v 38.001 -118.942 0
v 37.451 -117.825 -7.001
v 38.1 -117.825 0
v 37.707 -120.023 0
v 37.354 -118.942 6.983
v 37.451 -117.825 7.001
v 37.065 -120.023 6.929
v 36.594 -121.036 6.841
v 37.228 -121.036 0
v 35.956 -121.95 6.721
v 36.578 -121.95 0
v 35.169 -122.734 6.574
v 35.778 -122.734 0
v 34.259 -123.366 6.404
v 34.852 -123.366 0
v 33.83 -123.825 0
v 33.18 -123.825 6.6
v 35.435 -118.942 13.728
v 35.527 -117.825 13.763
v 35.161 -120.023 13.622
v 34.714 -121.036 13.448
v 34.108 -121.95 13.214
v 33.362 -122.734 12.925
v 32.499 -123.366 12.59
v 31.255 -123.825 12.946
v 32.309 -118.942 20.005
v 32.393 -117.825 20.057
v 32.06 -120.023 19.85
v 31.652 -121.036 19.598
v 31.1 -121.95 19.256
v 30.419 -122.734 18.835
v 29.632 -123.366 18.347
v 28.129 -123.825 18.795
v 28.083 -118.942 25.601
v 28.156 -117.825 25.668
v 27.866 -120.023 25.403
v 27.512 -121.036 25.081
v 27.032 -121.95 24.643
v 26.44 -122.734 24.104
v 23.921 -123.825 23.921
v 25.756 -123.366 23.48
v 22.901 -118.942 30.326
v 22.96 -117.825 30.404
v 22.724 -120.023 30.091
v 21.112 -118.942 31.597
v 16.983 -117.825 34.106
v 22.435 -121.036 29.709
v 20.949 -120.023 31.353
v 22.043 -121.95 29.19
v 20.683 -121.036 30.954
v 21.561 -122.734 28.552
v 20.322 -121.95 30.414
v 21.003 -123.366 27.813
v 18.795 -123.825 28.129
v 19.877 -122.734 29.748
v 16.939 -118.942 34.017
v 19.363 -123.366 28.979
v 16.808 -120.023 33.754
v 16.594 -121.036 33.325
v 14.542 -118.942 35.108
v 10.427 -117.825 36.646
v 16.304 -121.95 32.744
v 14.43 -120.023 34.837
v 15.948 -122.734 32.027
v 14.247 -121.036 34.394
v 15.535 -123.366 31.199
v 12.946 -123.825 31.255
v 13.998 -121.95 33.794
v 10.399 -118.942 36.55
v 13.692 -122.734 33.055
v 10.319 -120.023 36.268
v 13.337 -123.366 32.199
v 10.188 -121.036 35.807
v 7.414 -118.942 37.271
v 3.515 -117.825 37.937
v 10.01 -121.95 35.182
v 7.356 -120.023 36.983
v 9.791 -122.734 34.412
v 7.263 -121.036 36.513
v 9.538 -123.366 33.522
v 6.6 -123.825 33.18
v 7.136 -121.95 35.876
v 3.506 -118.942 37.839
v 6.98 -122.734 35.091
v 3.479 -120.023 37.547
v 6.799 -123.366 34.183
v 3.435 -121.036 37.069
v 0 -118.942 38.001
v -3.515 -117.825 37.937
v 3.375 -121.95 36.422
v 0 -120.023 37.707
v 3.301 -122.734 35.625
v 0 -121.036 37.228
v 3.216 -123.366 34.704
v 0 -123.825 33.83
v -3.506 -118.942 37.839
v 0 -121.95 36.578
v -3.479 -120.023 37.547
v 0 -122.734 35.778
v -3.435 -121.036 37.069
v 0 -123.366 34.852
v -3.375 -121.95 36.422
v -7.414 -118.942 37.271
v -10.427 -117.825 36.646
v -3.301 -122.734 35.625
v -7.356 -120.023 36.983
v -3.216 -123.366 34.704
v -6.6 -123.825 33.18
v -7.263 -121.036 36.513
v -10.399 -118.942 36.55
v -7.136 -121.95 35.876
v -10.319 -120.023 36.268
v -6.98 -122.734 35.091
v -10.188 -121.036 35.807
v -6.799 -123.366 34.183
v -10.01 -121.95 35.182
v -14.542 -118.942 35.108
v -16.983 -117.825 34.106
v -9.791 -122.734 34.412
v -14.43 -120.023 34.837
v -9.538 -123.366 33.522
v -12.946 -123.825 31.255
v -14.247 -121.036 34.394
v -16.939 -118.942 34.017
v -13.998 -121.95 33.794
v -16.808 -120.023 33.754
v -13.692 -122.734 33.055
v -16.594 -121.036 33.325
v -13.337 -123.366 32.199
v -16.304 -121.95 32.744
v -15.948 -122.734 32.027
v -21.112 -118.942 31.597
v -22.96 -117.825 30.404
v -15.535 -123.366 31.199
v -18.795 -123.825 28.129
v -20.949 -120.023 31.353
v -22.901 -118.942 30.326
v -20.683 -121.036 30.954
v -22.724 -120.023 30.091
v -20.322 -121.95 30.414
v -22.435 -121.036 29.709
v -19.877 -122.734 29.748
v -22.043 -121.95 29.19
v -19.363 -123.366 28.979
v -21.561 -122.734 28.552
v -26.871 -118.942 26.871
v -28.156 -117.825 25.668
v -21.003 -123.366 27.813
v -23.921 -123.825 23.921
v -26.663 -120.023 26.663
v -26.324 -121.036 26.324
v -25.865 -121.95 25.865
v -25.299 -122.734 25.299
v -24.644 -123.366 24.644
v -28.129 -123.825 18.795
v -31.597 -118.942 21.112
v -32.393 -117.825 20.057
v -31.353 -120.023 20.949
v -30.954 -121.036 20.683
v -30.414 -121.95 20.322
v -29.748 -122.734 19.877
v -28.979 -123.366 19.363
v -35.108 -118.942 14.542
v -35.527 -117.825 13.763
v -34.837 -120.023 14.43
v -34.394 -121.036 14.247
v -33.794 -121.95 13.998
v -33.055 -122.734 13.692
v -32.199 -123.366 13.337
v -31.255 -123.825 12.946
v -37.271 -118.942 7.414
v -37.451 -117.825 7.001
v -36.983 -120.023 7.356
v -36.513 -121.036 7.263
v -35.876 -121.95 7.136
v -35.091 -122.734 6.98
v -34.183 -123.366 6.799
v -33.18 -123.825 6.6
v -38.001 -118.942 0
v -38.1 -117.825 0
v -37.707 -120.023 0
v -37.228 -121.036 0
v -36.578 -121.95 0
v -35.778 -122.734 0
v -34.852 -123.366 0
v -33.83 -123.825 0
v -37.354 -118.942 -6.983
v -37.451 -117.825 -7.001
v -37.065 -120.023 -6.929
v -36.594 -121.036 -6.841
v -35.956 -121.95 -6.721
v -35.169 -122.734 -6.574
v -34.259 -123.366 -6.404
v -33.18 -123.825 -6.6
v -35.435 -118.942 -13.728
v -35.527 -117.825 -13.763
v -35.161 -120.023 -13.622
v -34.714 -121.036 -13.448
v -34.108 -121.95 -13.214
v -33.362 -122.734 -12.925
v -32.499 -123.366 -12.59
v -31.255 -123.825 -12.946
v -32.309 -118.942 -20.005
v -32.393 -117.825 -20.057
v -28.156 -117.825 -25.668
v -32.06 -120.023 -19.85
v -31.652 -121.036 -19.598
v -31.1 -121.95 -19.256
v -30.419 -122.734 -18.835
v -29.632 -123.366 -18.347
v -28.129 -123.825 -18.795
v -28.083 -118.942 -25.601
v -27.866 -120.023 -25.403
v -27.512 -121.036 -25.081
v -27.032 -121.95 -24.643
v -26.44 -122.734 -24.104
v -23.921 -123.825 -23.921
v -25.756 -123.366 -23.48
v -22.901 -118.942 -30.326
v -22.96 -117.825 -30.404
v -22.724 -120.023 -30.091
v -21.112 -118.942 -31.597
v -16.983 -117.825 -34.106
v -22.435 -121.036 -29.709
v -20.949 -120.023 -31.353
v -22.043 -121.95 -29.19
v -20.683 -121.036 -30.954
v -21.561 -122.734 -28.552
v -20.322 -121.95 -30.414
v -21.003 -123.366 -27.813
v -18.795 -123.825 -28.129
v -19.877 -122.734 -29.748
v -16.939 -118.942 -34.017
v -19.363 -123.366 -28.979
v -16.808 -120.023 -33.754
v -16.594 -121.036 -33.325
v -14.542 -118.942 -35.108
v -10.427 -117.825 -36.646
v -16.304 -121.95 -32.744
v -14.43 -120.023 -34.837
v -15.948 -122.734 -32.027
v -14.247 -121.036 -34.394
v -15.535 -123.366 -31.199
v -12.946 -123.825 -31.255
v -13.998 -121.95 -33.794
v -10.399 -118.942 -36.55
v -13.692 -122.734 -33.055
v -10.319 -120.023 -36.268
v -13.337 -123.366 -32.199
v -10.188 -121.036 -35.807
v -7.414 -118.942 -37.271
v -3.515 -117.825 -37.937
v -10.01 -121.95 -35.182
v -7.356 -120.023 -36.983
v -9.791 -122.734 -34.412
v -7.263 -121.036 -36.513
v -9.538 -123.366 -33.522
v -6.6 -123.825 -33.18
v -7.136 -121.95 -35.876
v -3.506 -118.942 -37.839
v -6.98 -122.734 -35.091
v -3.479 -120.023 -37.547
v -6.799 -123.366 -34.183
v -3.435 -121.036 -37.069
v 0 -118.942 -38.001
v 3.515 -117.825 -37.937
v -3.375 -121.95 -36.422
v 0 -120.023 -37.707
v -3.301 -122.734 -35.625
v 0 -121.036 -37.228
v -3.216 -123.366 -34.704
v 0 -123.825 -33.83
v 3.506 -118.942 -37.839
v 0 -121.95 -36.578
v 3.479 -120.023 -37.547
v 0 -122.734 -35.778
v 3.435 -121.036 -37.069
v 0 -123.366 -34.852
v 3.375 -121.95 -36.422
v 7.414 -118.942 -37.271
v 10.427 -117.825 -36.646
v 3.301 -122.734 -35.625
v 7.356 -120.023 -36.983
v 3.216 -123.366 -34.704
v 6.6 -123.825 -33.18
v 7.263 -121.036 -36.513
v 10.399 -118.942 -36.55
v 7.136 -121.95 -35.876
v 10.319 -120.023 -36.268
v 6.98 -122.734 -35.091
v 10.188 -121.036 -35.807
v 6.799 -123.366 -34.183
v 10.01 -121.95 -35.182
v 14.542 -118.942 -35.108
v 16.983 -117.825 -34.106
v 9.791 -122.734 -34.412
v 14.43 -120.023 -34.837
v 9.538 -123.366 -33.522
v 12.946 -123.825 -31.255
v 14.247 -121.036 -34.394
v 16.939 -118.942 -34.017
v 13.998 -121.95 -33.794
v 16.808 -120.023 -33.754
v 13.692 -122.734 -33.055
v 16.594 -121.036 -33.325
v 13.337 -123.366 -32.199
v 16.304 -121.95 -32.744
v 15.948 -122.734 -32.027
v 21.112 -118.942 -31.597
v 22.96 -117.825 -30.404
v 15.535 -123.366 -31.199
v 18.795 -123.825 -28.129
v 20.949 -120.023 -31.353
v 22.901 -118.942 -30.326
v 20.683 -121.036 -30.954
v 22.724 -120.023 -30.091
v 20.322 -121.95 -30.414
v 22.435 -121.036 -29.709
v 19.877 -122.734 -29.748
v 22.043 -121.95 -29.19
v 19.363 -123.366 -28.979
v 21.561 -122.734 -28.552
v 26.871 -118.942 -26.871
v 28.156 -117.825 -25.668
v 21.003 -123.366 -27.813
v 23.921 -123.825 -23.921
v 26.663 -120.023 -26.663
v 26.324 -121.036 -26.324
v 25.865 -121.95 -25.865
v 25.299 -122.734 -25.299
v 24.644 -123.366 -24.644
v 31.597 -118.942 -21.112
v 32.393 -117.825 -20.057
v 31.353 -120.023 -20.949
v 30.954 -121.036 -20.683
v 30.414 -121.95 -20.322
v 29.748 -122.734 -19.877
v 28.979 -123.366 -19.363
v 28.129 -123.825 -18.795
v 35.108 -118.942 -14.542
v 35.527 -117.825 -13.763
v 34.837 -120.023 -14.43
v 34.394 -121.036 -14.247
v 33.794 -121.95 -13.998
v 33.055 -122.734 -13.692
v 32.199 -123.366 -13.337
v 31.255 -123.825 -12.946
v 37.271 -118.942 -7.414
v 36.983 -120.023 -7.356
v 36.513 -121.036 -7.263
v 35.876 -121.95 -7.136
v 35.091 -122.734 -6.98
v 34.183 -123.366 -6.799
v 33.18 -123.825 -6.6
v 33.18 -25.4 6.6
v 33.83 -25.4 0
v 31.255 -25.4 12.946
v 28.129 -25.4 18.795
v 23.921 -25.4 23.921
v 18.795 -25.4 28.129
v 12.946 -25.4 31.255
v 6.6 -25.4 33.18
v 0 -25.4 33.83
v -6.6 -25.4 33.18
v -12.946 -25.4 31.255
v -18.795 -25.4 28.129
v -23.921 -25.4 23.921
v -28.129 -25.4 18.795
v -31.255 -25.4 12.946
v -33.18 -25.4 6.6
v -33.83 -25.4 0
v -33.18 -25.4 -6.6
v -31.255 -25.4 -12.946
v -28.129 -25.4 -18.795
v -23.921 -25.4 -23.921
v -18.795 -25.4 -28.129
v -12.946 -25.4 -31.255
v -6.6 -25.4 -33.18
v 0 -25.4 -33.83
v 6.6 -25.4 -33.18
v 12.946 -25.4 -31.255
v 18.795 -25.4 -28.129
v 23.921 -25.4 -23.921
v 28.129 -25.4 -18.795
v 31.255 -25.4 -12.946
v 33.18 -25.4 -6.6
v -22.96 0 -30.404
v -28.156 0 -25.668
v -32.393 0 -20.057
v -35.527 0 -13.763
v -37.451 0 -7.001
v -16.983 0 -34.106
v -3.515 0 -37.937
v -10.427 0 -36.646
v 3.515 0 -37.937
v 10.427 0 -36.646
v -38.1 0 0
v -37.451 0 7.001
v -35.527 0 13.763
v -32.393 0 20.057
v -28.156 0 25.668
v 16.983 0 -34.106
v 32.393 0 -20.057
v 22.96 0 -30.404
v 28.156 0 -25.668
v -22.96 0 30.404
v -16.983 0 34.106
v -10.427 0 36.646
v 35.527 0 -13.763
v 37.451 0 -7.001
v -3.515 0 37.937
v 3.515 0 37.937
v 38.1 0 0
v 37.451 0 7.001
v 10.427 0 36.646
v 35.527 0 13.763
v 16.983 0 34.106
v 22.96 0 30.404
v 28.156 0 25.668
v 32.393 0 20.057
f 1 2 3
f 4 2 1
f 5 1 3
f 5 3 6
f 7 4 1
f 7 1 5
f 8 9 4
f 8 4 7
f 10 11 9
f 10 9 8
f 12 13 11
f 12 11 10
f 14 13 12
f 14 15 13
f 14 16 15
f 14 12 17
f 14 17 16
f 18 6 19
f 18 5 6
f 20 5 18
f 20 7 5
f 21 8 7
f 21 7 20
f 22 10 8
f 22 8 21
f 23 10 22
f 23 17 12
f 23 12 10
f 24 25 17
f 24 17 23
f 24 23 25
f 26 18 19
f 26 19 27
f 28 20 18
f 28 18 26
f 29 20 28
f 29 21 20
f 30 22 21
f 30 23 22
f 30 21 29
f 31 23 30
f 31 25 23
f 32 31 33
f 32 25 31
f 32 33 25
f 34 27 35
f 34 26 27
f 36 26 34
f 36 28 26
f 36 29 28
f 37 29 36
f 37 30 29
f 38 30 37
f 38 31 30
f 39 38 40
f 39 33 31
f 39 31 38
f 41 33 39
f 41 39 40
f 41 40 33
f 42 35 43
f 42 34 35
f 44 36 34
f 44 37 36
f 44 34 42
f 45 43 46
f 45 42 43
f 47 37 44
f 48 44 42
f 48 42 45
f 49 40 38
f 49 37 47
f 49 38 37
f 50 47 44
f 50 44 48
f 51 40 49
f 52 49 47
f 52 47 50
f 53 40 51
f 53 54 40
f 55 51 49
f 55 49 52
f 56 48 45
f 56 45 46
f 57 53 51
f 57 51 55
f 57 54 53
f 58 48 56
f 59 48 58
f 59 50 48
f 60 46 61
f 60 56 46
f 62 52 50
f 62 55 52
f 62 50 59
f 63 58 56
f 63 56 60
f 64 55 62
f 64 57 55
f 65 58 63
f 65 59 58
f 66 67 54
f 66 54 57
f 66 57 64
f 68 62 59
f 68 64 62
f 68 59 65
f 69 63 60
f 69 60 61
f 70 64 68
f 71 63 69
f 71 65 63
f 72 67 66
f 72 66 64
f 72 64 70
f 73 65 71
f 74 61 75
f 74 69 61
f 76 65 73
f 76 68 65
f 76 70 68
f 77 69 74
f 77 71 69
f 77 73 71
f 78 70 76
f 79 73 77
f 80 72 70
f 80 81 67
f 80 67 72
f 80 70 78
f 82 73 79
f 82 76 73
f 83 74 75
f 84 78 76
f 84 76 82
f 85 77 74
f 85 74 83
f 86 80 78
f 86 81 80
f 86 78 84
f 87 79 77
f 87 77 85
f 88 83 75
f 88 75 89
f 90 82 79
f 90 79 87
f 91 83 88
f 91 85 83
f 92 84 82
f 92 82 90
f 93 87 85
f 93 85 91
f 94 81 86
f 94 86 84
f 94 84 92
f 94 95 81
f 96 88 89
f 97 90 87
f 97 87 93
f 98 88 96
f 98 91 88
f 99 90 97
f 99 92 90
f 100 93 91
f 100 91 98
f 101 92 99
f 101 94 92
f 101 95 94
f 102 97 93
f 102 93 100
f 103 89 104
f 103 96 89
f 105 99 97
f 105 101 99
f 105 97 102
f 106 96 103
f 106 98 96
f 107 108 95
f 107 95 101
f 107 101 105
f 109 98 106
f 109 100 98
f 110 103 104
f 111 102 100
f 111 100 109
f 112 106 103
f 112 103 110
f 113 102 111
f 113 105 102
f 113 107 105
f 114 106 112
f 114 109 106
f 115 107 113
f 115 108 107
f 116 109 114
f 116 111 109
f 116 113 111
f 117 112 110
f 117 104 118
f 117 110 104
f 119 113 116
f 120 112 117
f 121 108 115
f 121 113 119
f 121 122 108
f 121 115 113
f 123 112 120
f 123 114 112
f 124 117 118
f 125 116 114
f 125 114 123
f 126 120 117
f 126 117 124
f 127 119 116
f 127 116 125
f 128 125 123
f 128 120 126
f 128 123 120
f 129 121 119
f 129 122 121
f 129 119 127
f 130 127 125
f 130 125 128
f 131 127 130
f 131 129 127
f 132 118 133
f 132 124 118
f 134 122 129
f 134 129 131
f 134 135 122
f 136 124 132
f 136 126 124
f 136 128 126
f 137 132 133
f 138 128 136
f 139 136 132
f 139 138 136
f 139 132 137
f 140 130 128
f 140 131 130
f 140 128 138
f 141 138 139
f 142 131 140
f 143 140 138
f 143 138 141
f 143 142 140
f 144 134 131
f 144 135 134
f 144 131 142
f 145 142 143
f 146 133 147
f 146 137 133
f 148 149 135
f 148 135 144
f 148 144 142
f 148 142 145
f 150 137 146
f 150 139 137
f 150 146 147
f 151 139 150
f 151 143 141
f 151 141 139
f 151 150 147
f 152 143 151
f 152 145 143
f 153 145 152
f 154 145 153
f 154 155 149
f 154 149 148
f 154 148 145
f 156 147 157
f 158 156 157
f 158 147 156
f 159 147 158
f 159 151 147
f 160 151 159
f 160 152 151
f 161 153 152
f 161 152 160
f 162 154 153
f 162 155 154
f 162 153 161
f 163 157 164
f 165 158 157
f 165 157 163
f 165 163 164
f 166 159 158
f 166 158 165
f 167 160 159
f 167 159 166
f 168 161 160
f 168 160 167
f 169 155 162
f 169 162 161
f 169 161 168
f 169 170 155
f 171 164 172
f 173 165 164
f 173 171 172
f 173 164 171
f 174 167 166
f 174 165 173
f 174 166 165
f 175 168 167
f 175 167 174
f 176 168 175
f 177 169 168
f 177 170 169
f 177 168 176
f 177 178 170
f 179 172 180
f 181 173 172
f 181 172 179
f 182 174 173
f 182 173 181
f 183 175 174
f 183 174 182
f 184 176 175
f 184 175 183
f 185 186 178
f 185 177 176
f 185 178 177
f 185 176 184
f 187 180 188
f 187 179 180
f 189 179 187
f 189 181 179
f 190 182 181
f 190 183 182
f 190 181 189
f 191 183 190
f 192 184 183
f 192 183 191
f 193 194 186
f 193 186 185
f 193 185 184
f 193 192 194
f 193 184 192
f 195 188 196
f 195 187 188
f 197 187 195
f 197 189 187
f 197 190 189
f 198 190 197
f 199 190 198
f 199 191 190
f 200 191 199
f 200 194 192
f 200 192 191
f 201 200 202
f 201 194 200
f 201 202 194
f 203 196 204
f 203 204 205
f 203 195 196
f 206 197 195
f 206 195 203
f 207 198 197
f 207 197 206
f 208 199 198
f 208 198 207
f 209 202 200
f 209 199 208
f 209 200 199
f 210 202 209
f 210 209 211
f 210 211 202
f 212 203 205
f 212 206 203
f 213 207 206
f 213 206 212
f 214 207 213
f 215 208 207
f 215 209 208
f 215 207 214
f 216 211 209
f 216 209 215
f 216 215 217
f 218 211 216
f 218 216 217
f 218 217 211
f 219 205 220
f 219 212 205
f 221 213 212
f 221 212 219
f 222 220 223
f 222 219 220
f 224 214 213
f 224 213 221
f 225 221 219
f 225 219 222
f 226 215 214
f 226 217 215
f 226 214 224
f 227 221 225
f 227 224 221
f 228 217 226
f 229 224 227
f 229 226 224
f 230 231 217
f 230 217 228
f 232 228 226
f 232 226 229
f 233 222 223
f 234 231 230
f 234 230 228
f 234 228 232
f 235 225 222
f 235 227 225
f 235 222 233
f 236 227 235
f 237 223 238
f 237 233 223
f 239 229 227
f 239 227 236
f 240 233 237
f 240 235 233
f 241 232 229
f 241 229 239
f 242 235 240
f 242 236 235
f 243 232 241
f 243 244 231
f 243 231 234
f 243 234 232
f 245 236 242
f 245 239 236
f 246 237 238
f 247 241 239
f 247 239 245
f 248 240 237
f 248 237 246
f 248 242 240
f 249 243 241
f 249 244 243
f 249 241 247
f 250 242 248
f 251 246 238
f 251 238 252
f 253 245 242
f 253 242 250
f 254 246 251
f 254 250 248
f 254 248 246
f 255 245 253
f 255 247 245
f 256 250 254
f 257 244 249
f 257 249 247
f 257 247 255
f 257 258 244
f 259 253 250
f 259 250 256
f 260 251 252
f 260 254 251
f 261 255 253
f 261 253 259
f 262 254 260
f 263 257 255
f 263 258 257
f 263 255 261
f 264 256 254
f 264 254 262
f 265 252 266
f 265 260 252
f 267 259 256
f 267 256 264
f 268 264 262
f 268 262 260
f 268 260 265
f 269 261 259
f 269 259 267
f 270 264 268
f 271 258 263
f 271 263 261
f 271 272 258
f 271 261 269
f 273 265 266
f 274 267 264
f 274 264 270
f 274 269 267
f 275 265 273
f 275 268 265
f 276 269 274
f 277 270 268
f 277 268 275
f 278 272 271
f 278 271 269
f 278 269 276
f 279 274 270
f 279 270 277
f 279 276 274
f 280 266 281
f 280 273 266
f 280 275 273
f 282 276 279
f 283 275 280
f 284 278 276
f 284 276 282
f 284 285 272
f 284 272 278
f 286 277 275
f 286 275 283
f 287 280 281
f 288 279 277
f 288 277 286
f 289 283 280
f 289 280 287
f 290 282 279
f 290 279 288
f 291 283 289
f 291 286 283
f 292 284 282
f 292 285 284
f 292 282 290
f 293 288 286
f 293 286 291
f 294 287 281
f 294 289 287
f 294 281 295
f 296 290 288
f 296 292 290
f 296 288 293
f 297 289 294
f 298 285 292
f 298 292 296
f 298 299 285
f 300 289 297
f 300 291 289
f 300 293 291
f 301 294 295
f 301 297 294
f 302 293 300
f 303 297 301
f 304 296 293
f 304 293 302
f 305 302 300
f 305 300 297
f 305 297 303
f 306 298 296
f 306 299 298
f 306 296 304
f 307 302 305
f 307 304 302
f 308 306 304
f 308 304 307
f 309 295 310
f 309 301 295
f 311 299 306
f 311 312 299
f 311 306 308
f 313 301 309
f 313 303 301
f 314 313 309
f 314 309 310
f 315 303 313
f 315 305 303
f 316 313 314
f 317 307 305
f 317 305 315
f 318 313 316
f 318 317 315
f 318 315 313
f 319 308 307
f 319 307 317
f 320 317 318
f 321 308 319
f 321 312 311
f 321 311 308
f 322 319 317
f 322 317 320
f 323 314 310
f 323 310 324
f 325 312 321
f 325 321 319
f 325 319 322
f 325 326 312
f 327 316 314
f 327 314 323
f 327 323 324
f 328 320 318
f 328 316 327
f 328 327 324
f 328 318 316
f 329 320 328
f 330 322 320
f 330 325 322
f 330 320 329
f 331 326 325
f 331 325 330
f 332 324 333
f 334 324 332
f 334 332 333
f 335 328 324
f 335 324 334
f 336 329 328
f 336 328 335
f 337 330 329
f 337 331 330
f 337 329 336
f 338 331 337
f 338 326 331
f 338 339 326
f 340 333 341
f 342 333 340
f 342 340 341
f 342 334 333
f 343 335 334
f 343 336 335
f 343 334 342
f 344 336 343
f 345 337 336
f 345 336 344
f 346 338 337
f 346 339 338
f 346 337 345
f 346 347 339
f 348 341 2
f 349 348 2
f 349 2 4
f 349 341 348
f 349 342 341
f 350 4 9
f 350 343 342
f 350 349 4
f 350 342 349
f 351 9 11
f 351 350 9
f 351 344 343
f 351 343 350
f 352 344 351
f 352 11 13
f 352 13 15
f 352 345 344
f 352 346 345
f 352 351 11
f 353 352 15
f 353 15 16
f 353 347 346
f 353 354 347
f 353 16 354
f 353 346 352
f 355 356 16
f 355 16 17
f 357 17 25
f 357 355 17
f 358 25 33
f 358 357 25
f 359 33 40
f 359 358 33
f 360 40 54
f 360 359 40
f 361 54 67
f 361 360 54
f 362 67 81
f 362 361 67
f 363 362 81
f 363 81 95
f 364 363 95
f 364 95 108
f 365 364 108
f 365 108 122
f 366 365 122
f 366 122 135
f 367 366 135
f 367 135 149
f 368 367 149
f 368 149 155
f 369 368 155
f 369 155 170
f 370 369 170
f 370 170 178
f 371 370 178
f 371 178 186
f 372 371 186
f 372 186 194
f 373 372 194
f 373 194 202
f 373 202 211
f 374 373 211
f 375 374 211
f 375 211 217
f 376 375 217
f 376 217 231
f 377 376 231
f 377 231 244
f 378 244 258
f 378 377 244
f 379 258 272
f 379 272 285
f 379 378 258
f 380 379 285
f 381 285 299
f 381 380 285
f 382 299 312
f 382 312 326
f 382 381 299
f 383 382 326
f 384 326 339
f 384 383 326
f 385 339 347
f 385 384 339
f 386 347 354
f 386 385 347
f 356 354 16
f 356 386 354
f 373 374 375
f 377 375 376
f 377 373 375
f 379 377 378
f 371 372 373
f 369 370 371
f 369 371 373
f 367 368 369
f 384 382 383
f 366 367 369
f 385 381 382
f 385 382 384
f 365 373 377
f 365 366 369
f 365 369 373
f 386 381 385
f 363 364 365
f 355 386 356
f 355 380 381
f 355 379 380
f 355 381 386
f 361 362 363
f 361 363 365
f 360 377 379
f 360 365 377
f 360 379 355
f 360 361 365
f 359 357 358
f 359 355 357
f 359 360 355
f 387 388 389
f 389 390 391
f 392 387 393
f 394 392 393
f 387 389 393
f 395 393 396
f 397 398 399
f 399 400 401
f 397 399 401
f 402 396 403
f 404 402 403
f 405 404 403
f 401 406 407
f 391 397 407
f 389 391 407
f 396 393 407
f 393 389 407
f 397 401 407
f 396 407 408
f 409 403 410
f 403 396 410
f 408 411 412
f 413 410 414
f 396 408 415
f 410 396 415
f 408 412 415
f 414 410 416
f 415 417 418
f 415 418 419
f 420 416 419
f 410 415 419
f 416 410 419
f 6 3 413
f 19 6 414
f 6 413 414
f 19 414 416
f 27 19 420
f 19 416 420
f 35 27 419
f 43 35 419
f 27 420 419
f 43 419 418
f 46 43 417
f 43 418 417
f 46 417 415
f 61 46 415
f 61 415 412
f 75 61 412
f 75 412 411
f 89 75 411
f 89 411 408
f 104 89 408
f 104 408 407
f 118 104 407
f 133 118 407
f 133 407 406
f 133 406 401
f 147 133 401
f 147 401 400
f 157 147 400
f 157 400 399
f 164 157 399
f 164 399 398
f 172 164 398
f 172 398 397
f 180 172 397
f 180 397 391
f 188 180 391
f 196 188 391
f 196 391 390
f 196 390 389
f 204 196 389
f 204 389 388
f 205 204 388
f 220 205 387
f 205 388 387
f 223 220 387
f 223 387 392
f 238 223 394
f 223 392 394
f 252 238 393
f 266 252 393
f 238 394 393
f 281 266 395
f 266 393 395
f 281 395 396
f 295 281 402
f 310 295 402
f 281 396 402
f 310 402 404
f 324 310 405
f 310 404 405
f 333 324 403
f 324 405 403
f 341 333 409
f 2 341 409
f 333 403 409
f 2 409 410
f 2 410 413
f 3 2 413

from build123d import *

# Parameters (mm, degrees)
F0_R     = 38.1
F0_R_2   = 33.8298969846
F1_DEPTH = 123.825
F2_DEPTH = 9.525
F4_DEPTH = 12.7
F5_R     = 35.7824148946
F6_DEPTH = 25.4


# Not quite as in the source:
# - a fillet or chamfer that OpenCascade refuses, or shapes differently, is made with other operations: its cross-section is extruded or revolved along the edge and cut away or added


with BuildPart() as f1:
    # F0 (on Front) → F1 (new body)
    with BuildSketch(Plane.XZ):
        Circle(F0_R)
        Circle(F0_R_2, mode=Mode.SUBTRACT)
    extrude(amount=F1_DEPTH)

    # F0 (on Front) → F2 (join)
    with BuildSketch(Plane.XZ):
        Circle(F0_R)
        Circle(F0_R_2, mode=Mode.SUBTRACT)
    extrude(amount=F2_DEPTH)

    # F3: fillet of radius 6.35 on 1 edges, made by hand

    # F3_s1 → F3_t2 (revolve, cut)
    with BuildSketch(Plane.XY):
        with BuildLine():
            ThreePointArc((38.1, -117.8252892959), (36.923482669, -121.5073508209), (33.8298969846, -123.825))
            Line((33.8298969846, -123.825), (38.1, -123.825))
            Line((38.1, -123.825), (38.1, -117.8252892959))
        make_face()
    revolve(axis=Axis((0, -123.825, 0), (0, -1, 0)), mode=Mode.SUBTRACT)

    # F0 (on Front) → F4 (join)
    with BuildSketch(Plane.XZ):
        Circle(F0_R)
        Circle(F0_R_2, mode=Mode.SUBTRACT)
    extrude(amount=F4_DEPTH)

    # F5 (on Front) → F6 (join)
    with BuildSketch(Plane.XZ):
        Circle(F5_R)
    extrude(amount=F6_DEPTH)


solid = f1.part
